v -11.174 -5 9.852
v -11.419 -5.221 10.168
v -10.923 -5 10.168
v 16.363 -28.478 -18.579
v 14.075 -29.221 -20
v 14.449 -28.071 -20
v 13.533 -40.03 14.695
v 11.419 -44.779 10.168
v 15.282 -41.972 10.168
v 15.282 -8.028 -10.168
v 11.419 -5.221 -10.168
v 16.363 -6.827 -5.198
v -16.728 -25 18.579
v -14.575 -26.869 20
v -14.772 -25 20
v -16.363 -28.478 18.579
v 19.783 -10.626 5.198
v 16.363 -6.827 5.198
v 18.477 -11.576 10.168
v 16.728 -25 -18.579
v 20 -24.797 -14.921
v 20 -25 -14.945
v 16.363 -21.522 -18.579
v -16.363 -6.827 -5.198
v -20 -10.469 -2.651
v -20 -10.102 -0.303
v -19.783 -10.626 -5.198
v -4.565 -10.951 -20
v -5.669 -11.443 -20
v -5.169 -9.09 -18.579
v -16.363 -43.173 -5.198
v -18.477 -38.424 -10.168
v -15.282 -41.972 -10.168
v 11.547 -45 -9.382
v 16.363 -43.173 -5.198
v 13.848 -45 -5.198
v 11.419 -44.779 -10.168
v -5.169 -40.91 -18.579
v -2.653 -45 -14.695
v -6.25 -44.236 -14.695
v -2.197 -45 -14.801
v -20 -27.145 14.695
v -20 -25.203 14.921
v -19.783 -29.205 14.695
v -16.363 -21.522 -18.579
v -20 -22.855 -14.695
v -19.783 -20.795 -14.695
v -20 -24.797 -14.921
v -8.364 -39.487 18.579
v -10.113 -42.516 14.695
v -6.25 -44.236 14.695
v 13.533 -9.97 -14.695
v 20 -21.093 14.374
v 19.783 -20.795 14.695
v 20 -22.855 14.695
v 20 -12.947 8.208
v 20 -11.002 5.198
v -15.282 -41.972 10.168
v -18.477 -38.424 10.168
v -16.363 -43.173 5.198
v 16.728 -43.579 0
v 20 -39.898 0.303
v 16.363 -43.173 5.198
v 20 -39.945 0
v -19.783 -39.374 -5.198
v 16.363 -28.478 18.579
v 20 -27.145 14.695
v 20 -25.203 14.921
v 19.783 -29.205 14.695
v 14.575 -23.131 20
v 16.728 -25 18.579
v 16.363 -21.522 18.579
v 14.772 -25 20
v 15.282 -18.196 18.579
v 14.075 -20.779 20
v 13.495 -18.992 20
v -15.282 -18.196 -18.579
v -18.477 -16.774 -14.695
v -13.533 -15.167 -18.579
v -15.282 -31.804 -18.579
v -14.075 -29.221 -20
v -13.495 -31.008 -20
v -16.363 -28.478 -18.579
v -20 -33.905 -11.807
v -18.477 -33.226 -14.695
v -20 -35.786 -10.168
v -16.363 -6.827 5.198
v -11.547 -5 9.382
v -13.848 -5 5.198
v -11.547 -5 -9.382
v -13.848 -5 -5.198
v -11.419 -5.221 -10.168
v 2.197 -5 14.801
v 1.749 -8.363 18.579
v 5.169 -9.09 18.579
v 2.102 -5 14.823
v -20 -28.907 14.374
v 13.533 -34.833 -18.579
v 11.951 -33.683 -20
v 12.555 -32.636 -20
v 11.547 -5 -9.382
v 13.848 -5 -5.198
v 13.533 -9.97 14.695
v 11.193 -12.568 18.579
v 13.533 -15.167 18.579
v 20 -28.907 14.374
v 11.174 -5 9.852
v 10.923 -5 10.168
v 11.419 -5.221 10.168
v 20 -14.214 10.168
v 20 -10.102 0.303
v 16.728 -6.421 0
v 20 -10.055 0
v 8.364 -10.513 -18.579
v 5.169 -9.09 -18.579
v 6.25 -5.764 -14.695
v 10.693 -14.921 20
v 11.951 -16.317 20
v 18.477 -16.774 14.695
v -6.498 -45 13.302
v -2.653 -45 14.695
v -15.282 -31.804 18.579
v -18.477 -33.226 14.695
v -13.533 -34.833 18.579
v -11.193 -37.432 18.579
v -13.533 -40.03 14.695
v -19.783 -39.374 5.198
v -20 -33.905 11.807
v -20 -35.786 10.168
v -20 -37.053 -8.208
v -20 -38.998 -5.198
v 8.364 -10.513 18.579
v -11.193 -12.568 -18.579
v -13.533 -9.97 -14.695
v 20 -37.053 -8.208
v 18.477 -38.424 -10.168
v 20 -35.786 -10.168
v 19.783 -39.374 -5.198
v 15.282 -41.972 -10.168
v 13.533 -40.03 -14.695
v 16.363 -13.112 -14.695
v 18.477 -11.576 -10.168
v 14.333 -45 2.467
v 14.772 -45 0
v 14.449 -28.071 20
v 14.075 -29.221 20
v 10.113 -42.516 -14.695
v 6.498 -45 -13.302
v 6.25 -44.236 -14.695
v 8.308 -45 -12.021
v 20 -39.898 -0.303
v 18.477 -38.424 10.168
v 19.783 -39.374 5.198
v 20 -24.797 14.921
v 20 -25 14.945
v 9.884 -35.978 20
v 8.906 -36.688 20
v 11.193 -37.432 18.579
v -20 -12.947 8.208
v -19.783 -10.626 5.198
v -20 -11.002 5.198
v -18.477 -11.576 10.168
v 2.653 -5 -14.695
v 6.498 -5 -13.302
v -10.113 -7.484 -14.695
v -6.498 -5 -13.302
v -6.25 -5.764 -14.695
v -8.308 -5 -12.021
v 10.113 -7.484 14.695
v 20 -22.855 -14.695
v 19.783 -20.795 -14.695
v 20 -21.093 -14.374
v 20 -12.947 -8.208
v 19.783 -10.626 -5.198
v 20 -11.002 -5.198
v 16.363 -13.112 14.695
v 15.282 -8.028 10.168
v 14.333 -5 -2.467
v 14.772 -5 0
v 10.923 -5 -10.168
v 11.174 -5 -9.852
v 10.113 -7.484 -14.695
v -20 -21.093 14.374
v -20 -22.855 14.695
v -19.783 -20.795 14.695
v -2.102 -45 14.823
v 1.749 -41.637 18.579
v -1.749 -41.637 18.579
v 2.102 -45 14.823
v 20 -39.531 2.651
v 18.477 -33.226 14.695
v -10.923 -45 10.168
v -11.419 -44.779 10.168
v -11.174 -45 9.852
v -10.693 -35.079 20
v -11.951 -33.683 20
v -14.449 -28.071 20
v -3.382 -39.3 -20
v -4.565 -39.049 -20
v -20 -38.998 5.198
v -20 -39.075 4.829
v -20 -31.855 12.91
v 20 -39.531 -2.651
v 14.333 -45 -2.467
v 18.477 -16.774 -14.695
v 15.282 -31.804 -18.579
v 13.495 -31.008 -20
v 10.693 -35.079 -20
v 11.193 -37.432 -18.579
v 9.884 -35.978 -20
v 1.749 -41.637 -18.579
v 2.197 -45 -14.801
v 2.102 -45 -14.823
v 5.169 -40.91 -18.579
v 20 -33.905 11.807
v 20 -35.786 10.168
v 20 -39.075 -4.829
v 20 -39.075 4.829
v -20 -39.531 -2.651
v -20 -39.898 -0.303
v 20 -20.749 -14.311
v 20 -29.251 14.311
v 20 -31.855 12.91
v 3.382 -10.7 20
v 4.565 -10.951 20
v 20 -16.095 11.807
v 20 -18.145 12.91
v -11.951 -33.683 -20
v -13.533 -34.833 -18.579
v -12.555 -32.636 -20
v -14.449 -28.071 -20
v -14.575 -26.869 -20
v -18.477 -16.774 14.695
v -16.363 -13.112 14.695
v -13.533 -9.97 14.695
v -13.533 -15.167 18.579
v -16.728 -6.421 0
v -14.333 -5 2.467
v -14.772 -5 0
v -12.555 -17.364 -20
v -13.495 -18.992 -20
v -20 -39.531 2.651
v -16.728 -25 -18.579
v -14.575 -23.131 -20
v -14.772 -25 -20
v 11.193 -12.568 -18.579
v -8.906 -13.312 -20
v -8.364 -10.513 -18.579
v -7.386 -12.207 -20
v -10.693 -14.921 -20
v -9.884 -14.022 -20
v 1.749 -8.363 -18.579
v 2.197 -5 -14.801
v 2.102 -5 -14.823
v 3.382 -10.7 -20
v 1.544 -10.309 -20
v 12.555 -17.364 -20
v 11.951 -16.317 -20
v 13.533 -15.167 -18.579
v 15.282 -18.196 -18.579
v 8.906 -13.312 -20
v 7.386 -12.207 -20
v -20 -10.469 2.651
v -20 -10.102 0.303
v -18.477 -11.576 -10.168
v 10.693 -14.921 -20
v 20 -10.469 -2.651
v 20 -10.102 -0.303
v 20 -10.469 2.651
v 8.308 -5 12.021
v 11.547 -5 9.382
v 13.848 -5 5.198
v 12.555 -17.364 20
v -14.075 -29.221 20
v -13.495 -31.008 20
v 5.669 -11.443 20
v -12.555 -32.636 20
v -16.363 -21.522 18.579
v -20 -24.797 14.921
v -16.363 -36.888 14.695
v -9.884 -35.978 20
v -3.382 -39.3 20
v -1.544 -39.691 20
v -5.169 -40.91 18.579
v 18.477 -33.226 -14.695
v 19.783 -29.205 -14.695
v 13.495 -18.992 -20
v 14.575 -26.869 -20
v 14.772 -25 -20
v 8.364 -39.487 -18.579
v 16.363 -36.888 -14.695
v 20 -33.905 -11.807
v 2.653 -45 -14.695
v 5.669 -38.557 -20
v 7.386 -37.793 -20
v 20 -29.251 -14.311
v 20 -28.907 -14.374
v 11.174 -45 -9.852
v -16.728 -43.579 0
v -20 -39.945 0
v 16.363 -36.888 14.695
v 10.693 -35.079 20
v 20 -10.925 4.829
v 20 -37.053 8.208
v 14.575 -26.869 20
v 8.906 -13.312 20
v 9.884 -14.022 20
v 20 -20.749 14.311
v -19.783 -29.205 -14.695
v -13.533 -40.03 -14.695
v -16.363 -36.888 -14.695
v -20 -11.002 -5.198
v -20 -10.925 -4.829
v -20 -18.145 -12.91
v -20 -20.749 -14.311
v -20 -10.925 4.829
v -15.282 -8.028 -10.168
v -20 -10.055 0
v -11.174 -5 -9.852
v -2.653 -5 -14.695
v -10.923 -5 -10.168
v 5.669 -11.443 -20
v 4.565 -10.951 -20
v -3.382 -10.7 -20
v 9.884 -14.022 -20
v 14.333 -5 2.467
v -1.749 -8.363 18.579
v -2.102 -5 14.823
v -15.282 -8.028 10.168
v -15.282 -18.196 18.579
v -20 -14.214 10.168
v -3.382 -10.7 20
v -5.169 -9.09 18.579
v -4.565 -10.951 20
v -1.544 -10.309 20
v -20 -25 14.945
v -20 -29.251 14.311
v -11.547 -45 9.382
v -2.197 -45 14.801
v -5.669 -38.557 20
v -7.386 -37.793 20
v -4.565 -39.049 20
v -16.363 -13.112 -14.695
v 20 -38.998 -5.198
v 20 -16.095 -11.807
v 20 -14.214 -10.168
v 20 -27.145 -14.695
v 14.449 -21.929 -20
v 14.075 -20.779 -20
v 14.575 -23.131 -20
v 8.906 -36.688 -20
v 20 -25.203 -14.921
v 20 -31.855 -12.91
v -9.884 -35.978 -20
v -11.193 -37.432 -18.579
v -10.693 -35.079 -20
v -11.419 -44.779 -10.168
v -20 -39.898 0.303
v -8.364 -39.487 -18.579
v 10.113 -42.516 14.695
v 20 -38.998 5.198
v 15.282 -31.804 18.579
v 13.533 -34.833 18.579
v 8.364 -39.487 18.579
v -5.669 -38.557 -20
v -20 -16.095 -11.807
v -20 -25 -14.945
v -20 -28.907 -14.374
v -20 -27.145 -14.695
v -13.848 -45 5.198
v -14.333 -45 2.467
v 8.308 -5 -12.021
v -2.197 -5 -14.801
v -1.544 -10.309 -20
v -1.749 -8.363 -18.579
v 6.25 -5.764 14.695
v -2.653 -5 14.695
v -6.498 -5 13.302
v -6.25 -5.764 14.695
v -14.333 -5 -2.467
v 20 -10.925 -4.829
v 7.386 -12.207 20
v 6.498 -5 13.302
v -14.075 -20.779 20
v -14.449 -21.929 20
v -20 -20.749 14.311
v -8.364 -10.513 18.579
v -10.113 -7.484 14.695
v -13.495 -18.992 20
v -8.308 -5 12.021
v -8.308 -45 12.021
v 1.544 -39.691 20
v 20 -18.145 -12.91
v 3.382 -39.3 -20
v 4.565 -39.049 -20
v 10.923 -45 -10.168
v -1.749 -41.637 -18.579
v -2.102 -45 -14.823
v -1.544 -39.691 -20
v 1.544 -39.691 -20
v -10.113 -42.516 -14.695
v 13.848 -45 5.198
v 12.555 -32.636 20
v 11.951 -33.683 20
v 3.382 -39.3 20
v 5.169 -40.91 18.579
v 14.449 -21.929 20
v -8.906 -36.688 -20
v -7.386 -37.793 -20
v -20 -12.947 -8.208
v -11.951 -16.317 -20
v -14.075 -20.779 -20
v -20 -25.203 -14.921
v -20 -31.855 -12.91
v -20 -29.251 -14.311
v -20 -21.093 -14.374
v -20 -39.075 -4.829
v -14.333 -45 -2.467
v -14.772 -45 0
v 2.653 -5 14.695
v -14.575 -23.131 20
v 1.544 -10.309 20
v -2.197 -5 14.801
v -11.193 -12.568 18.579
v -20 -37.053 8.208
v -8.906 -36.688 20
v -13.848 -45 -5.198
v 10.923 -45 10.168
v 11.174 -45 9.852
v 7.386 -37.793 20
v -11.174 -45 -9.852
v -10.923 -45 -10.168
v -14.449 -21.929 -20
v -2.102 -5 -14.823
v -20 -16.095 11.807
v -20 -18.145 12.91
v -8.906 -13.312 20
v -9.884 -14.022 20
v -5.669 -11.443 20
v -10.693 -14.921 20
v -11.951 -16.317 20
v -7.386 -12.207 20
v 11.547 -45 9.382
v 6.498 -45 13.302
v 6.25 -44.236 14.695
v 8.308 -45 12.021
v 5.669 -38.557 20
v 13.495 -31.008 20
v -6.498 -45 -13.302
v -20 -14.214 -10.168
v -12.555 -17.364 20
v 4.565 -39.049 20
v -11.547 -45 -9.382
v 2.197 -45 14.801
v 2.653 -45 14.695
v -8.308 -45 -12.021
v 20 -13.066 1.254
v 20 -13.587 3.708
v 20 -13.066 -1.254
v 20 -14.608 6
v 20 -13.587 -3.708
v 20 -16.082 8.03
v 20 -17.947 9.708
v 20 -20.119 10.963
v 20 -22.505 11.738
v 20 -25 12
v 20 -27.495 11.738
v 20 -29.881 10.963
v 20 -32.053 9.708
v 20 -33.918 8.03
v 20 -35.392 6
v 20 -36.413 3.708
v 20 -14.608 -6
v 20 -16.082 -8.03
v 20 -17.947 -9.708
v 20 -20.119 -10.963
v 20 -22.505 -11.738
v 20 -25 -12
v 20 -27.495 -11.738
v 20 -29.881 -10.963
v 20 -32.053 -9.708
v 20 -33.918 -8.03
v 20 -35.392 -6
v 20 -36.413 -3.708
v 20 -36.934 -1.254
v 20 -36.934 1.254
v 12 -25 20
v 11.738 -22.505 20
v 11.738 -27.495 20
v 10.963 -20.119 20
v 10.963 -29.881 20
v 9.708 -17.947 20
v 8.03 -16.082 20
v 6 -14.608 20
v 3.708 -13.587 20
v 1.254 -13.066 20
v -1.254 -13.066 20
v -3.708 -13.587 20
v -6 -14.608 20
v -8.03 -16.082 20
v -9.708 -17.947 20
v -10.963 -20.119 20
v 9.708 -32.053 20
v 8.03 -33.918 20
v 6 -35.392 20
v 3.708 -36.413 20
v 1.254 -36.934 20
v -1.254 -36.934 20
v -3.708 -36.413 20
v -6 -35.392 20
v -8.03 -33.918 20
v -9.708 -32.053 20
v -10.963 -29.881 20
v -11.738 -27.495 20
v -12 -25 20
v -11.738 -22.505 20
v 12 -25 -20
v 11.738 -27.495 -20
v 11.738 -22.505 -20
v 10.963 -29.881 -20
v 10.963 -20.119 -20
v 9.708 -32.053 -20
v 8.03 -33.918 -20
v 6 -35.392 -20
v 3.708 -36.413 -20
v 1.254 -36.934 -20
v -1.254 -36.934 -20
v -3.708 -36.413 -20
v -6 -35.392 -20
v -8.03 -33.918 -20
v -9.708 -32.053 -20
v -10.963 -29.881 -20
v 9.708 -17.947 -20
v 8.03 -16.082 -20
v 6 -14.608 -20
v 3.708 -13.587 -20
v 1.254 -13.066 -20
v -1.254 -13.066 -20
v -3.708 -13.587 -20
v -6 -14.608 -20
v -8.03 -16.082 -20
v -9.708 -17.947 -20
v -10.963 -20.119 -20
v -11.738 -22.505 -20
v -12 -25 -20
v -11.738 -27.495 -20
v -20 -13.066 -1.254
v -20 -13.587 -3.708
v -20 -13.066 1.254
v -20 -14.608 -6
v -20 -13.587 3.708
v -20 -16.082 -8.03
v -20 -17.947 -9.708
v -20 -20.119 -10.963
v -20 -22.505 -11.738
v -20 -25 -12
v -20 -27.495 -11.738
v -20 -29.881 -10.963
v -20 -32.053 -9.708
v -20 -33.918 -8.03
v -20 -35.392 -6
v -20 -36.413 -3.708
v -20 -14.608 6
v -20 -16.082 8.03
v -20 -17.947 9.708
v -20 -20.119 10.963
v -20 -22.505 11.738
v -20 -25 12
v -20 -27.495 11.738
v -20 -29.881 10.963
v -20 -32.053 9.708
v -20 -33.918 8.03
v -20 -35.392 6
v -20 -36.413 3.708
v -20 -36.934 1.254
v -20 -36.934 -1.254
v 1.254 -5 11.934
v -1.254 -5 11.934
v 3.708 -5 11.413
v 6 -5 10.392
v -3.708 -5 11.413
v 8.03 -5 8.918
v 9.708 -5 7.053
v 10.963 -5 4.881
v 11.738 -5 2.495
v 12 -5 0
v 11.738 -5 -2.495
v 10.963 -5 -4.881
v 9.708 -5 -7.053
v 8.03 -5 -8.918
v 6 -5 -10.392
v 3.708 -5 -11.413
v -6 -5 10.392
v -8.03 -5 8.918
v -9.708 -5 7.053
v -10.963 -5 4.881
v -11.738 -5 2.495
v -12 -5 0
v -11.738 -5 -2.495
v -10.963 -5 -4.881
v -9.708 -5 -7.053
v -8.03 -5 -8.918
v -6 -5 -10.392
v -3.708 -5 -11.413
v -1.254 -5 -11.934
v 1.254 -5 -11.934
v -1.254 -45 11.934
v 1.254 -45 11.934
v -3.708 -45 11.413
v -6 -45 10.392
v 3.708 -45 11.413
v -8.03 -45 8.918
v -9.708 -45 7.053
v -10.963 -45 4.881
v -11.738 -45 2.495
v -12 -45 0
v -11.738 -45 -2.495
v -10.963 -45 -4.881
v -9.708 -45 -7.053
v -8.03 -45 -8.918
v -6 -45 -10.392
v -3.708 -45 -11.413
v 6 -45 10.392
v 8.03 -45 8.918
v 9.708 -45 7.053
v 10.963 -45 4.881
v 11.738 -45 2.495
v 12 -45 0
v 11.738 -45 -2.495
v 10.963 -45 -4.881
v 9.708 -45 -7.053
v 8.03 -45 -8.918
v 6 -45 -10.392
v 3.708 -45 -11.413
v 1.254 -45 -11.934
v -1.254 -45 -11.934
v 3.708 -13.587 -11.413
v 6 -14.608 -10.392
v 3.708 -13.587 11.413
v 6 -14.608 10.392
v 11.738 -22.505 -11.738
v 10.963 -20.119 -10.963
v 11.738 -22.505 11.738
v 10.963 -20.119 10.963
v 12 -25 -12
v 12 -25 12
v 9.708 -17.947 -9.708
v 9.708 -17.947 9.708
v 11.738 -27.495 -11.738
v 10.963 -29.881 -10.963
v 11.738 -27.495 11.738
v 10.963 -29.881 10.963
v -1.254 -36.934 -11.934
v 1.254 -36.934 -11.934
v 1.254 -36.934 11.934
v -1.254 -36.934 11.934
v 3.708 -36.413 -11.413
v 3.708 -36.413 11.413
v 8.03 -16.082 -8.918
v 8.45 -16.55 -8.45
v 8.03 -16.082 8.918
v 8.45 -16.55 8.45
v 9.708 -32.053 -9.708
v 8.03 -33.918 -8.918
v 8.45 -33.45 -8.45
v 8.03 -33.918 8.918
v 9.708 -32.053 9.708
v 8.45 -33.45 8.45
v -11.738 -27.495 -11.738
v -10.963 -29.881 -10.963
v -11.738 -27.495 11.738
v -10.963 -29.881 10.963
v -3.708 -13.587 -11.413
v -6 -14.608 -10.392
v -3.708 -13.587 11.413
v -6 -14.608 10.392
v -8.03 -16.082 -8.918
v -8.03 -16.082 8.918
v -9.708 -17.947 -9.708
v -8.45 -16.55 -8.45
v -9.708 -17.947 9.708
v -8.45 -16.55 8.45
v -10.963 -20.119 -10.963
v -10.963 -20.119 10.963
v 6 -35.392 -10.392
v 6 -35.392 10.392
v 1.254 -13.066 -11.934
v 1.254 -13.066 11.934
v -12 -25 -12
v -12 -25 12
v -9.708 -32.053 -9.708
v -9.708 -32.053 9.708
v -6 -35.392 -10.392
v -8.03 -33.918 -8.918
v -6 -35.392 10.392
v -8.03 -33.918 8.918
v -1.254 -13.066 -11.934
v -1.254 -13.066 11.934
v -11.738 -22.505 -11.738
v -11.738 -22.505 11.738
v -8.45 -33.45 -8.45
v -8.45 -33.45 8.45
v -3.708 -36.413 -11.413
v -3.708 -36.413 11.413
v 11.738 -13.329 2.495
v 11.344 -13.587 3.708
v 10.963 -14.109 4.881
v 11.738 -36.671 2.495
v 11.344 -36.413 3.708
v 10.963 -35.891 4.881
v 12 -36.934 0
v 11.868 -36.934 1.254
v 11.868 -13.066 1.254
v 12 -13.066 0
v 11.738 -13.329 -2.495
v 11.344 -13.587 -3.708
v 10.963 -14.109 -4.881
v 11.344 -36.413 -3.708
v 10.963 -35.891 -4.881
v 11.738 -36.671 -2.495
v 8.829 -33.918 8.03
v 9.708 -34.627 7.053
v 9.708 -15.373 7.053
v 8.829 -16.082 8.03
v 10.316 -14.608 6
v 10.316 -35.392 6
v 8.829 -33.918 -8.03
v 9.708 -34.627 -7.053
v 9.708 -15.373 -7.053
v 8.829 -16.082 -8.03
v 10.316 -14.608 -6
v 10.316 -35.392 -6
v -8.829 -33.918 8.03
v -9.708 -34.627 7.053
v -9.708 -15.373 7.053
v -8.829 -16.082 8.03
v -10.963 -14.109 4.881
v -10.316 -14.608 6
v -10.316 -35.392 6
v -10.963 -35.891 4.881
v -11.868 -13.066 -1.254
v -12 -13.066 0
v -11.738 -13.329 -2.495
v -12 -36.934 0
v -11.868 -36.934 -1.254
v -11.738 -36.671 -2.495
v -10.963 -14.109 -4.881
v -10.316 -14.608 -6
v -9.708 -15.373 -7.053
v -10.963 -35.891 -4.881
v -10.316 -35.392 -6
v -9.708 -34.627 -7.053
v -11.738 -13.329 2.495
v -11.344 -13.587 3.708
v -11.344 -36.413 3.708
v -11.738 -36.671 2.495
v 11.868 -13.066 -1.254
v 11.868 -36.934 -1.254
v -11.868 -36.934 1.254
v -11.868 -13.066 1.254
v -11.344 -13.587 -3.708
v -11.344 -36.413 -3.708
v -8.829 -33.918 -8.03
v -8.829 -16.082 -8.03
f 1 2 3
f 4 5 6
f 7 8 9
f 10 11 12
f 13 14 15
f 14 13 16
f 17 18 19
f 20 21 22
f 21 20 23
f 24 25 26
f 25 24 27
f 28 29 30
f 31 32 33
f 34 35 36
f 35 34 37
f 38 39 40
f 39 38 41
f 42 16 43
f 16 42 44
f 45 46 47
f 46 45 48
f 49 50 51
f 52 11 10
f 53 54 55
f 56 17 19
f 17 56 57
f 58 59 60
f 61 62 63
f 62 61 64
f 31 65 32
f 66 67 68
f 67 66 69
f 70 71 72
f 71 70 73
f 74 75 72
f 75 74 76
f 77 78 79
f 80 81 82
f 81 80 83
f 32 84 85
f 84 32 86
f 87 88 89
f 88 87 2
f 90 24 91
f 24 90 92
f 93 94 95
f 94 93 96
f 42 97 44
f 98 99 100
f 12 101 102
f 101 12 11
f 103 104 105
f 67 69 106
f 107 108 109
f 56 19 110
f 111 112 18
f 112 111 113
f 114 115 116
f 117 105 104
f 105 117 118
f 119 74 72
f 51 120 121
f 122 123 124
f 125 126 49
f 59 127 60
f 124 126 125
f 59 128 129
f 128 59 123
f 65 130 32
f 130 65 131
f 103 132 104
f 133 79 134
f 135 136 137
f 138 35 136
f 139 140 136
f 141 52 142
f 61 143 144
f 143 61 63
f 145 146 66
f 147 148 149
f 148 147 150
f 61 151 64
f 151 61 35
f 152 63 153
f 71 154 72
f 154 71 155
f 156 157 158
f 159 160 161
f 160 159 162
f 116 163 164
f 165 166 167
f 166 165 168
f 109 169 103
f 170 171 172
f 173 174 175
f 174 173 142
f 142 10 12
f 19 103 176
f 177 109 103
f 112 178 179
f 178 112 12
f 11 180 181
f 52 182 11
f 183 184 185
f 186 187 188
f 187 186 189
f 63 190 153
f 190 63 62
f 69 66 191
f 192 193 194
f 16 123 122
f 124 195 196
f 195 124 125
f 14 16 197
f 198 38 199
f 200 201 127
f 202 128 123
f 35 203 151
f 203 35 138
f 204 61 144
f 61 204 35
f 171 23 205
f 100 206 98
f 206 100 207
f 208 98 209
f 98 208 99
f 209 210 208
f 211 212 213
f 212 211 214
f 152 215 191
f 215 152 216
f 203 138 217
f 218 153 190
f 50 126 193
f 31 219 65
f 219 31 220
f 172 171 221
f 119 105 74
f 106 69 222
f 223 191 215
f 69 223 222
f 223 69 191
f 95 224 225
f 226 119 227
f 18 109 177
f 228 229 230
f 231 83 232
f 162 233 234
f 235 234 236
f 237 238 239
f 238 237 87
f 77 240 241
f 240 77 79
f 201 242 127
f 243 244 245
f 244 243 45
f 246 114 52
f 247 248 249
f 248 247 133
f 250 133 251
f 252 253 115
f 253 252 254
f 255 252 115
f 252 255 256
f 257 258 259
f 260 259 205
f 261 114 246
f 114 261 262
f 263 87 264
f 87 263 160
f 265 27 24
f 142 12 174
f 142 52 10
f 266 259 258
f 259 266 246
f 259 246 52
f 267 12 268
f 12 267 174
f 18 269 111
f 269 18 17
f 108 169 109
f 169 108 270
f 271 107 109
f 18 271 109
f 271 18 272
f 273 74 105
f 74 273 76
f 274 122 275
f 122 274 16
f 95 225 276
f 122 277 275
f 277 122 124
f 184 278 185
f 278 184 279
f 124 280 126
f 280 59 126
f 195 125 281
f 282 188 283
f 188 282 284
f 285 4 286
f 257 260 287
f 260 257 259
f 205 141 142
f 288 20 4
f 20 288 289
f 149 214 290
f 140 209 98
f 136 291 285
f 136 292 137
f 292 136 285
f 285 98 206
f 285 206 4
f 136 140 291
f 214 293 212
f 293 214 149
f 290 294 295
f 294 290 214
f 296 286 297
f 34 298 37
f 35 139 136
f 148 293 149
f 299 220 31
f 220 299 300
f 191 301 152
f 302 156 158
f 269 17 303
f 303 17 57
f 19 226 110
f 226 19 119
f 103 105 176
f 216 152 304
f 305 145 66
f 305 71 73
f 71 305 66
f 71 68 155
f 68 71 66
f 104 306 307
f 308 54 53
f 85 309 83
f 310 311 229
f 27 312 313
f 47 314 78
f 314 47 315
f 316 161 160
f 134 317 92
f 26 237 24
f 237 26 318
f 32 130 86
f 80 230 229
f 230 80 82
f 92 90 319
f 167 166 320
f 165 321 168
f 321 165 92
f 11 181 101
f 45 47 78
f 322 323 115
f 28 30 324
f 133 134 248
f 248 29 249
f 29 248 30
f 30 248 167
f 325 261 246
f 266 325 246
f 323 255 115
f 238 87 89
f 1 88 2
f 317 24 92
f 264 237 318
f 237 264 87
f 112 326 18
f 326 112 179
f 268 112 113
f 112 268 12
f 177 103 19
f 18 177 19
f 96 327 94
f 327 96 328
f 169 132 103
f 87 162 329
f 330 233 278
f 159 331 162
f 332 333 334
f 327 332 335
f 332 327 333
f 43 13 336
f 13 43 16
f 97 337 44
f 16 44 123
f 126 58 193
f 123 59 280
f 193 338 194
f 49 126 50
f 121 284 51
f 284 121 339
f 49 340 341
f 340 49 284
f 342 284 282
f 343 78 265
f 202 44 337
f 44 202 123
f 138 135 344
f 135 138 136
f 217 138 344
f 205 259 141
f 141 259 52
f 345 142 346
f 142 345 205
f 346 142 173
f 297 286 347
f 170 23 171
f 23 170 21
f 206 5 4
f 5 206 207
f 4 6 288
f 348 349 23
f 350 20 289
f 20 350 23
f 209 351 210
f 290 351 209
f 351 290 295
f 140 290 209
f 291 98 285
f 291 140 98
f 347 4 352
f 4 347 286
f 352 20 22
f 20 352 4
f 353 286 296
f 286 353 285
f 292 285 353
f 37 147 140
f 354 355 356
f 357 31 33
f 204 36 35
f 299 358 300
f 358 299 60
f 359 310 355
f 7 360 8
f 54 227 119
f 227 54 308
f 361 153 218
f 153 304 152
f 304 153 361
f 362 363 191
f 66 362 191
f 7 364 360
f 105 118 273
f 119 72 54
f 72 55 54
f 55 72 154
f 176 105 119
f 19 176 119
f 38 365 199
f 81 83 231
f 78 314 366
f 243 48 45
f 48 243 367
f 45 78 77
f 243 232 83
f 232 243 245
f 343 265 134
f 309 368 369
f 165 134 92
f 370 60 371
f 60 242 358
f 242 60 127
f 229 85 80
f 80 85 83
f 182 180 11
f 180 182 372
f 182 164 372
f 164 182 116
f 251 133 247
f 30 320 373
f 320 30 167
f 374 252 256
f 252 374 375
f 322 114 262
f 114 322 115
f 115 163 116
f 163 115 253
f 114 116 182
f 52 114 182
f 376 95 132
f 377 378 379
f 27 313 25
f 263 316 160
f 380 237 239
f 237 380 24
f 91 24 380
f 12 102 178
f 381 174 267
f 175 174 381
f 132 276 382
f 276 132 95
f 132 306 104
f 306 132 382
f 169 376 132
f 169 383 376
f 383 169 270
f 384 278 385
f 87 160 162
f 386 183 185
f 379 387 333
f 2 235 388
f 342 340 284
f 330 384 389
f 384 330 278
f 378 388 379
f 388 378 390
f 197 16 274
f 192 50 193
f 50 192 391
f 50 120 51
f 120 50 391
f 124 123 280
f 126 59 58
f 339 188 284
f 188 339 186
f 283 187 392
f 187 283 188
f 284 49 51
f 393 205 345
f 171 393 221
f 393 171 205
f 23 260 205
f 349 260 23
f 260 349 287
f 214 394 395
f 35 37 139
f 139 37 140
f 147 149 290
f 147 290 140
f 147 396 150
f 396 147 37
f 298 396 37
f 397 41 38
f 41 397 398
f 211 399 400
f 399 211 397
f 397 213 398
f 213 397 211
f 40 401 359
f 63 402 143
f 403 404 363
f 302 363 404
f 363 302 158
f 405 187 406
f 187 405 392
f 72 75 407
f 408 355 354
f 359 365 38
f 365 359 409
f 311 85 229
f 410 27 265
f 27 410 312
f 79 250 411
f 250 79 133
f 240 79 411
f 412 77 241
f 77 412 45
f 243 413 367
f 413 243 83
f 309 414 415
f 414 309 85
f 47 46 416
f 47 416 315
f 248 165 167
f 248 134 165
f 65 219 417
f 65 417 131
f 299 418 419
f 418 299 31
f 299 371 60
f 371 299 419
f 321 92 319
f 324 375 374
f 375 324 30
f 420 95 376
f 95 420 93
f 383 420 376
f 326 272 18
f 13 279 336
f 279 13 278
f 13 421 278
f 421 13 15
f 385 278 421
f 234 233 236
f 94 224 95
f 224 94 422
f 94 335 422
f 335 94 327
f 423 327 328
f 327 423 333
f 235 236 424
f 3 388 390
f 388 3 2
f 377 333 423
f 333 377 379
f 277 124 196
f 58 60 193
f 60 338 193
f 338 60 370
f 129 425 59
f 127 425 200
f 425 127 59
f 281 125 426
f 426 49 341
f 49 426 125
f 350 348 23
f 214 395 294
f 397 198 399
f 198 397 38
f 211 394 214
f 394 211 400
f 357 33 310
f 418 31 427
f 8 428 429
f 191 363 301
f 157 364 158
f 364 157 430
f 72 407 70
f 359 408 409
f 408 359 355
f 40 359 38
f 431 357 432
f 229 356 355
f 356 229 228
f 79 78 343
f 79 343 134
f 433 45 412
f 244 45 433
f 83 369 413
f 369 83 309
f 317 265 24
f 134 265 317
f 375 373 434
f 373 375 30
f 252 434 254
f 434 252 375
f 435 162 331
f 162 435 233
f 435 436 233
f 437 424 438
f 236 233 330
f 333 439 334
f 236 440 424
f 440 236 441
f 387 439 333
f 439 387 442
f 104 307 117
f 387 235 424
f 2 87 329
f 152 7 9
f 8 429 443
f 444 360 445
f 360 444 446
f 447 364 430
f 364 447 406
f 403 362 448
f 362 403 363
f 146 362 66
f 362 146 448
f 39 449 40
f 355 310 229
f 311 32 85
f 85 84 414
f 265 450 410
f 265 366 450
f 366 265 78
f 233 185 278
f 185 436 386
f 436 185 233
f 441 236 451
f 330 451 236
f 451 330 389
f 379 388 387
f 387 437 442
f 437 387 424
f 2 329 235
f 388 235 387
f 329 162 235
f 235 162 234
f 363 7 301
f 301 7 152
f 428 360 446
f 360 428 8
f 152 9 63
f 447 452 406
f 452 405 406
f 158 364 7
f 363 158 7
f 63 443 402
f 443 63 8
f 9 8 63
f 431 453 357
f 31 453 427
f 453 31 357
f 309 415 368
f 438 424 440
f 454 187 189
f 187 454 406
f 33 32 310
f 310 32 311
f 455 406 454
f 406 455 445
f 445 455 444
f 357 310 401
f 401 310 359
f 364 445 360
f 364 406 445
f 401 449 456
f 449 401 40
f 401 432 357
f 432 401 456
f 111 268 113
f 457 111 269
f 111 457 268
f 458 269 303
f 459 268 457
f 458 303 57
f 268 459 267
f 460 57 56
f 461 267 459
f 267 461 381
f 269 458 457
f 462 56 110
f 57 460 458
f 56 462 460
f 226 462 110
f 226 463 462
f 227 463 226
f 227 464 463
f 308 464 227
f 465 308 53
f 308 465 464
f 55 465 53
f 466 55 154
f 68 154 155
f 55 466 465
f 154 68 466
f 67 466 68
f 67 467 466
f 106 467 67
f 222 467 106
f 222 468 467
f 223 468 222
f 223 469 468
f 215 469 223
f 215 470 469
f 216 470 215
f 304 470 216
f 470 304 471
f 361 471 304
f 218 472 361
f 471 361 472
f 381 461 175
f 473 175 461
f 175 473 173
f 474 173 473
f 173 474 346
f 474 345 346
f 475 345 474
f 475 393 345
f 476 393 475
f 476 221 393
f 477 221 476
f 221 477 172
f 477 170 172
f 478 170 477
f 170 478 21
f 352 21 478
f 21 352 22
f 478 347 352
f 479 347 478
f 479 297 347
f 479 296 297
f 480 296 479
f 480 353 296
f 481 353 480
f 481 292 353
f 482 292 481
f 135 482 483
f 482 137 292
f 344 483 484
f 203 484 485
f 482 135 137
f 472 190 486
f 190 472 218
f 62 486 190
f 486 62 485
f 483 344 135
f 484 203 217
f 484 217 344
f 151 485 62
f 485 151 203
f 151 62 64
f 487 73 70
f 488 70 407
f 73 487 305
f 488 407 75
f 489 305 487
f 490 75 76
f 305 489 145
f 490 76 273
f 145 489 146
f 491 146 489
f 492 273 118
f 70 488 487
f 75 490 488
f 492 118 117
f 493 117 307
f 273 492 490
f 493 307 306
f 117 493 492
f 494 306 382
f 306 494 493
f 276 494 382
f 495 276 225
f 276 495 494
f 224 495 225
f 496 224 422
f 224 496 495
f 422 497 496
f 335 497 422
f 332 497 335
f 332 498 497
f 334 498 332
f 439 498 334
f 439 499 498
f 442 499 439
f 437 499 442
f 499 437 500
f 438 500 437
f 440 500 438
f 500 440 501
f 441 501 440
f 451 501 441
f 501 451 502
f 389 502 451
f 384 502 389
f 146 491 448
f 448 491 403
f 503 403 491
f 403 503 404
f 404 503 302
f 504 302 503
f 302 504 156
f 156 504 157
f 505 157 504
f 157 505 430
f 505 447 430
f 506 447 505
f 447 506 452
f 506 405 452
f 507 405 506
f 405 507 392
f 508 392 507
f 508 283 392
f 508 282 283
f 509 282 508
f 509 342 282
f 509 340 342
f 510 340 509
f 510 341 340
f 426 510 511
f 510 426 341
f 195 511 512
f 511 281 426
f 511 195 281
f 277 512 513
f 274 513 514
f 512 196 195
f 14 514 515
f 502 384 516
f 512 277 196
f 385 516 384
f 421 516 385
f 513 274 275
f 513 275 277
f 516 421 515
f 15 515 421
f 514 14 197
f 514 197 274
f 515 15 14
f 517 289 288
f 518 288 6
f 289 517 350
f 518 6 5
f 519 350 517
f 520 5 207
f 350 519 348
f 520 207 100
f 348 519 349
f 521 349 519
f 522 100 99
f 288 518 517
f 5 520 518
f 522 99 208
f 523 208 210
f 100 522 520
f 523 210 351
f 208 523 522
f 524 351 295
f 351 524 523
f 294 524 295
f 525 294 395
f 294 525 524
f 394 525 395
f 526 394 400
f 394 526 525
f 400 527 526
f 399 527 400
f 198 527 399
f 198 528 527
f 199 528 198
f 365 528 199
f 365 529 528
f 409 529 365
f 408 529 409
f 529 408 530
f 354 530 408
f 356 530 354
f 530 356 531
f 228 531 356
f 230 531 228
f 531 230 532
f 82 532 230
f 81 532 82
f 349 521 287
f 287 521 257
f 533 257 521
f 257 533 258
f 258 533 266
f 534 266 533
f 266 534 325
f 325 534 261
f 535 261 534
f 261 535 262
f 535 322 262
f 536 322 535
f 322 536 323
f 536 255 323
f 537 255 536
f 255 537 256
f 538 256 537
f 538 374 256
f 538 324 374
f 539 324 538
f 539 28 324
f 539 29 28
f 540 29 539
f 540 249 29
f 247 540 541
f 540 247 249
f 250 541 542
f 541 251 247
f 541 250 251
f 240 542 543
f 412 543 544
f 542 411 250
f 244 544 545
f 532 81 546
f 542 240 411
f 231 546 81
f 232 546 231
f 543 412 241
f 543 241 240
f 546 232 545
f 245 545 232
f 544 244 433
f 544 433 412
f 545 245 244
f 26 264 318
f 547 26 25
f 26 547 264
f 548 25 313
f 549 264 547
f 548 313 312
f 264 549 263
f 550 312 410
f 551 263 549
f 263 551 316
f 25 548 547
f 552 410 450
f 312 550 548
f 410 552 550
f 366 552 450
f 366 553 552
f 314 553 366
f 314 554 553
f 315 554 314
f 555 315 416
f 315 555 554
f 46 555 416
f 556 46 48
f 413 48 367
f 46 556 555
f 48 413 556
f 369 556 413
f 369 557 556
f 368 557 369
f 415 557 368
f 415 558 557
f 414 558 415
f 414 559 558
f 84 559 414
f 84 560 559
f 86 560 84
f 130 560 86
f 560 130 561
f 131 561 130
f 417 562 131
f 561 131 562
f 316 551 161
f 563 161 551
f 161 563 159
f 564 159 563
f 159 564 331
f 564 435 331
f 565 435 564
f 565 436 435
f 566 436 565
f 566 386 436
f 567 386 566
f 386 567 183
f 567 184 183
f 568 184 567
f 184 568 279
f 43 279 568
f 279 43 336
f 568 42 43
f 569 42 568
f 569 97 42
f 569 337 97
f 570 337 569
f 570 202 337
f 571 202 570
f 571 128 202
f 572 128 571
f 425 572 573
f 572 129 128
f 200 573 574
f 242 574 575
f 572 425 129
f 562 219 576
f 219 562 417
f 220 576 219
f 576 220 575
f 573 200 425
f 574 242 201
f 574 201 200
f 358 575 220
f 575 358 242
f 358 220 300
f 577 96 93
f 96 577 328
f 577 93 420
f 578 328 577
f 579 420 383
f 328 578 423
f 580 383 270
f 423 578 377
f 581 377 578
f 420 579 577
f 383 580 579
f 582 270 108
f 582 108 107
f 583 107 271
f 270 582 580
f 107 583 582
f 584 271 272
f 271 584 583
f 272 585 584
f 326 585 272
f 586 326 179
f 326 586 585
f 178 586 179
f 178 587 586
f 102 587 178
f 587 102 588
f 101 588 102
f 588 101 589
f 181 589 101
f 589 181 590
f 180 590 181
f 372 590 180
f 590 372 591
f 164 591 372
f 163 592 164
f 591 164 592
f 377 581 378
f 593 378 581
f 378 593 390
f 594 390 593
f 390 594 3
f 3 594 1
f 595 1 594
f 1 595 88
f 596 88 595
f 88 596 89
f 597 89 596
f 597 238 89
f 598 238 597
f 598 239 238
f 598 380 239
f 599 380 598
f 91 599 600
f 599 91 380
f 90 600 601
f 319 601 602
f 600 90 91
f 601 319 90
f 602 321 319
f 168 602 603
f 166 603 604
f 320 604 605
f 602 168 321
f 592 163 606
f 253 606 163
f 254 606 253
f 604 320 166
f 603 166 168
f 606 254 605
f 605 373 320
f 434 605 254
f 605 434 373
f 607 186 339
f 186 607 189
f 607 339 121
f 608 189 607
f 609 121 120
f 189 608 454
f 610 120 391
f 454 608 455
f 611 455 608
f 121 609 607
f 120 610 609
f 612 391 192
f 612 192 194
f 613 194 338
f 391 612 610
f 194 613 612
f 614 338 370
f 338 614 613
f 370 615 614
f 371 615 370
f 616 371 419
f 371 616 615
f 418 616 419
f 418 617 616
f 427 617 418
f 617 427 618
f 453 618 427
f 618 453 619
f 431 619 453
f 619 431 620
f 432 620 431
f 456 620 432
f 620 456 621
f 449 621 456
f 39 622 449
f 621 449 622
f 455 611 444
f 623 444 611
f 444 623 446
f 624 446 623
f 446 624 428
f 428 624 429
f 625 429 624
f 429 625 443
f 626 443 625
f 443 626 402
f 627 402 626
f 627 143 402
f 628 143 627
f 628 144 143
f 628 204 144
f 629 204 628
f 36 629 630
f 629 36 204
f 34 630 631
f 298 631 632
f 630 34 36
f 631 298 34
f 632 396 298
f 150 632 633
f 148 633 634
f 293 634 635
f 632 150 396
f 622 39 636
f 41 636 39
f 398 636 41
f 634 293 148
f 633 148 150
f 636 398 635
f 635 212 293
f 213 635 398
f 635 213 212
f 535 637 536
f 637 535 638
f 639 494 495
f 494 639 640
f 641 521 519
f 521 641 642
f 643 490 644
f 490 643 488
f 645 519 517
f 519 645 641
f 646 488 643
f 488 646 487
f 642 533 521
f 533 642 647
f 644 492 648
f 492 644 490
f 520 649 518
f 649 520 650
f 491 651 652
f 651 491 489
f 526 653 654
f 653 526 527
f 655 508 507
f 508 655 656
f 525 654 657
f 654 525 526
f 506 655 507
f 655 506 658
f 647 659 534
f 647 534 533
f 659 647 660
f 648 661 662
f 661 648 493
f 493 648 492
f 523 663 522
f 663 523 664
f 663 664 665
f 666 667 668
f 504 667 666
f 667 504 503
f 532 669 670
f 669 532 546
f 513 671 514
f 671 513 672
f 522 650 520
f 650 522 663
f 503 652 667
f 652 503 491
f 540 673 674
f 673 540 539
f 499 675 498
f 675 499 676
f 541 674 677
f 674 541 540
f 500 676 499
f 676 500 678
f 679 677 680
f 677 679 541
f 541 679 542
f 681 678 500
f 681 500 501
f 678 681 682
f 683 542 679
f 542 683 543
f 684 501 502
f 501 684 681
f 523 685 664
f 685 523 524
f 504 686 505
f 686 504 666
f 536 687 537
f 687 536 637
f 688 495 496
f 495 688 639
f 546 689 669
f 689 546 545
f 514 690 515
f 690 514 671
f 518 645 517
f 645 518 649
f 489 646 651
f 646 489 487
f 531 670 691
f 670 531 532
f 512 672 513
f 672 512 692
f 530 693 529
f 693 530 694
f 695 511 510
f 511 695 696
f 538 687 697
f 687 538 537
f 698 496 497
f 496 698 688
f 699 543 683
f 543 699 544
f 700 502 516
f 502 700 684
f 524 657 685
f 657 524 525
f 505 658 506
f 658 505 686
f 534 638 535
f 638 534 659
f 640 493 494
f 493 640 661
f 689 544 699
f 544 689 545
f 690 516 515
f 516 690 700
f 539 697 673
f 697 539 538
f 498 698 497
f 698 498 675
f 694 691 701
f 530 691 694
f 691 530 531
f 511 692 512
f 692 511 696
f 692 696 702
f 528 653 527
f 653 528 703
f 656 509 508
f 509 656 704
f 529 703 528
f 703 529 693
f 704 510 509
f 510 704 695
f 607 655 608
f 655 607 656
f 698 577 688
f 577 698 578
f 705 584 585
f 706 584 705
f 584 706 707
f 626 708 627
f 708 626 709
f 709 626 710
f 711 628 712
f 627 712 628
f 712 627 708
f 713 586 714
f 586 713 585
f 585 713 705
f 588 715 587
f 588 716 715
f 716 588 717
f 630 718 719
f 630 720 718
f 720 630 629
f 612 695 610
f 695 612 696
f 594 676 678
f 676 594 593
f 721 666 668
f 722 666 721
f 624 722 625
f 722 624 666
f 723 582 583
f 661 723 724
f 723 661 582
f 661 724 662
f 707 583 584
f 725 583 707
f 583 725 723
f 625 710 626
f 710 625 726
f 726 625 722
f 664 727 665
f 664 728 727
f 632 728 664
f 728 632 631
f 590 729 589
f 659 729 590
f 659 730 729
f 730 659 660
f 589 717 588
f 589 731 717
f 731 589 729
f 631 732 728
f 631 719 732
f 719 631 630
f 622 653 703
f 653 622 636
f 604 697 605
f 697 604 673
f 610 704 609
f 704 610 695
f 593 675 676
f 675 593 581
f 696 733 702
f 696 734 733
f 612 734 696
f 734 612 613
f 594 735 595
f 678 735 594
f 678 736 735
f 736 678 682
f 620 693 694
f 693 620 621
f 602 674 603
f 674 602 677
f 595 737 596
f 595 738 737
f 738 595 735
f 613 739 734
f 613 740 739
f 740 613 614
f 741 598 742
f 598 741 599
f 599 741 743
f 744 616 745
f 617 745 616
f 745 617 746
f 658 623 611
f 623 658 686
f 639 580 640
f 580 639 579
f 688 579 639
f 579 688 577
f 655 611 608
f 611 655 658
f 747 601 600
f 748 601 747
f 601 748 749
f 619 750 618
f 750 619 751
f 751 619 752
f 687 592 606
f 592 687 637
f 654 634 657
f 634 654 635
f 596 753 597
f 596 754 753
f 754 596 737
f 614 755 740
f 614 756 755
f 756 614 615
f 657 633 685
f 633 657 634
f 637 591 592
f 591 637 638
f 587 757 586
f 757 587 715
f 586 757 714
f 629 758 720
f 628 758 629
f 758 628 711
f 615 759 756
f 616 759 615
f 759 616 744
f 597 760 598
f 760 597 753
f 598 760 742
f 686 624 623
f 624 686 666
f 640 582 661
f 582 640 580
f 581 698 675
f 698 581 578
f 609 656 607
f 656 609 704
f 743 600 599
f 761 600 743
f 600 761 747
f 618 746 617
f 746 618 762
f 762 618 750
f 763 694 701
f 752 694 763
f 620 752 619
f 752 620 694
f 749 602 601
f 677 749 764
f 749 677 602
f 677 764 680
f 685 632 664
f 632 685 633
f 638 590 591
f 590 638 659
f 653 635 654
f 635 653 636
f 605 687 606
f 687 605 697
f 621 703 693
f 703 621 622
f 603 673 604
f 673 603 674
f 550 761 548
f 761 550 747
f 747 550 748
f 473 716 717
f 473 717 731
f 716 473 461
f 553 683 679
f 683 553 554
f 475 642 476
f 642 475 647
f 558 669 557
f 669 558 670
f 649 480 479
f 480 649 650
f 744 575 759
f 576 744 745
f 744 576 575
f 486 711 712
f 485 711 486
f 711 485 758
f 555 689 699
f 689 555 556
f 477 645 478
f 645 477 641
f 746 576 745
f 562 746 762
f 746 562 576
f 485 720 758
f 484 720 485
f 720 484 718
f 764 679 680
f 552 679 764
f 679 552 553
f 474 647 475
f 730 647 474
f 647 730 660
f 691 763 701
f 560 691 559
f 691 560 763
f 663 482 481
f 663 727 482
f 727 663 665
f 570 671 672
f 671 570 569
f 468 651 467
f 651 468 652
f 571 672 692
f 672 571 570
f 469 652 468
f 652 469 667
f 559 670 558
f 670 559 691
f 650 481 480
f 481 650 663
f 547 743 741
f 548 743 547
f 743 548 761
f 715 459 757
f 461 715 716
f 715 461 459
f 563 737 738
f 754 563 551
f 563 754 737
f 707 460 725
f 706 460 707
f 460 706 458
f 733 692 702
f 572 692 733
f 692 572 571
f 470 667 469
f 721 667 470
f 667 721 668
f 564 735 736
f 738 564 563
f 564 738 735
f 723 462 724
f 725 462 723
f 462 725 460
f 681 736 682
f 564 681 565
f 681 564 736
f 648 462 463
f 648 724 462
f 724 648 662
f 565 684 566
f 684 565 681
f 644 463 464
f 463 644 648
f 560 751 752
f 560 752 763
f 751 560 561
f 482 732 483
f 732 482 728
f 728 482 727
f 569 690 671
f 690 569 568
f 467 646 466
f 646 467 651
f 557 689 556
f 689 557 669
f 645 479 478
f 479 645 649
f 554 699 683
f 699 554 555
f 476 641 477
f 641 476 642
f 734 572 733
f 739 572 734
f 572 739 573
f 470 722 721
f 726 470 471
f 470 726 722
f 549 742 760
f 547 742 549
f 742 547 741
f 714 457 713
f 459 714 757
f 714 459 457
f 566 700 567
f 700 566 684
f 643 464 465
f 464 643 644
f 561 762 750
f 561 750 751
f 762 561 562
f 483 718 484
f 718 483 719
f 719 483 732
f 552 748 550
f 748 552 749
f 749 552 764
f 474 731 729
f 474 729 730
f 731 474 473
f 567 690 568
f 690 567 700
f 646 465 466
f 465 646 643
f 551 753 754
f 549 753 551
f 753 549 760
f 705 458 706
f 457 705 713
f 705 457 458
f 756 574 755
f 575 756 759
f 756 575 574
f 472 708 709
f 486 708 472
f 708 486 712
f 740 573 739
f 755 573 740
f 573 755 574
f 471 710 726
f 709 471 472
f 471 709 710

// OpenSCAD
difference() {
  intersection() {
    translate([0,-25,0]) sphere(25);
    translate([-20,-45,-20]) cube(40);
  }
  union() {
    translate([0,-25,-25]) cylinder(50,12,12);
    rotate([90,0,0]) cylinder(50,12,12);
    translate([-25,-25,0]) rotate([0,90,0]) cylinder(50,12,12);
  }
}
